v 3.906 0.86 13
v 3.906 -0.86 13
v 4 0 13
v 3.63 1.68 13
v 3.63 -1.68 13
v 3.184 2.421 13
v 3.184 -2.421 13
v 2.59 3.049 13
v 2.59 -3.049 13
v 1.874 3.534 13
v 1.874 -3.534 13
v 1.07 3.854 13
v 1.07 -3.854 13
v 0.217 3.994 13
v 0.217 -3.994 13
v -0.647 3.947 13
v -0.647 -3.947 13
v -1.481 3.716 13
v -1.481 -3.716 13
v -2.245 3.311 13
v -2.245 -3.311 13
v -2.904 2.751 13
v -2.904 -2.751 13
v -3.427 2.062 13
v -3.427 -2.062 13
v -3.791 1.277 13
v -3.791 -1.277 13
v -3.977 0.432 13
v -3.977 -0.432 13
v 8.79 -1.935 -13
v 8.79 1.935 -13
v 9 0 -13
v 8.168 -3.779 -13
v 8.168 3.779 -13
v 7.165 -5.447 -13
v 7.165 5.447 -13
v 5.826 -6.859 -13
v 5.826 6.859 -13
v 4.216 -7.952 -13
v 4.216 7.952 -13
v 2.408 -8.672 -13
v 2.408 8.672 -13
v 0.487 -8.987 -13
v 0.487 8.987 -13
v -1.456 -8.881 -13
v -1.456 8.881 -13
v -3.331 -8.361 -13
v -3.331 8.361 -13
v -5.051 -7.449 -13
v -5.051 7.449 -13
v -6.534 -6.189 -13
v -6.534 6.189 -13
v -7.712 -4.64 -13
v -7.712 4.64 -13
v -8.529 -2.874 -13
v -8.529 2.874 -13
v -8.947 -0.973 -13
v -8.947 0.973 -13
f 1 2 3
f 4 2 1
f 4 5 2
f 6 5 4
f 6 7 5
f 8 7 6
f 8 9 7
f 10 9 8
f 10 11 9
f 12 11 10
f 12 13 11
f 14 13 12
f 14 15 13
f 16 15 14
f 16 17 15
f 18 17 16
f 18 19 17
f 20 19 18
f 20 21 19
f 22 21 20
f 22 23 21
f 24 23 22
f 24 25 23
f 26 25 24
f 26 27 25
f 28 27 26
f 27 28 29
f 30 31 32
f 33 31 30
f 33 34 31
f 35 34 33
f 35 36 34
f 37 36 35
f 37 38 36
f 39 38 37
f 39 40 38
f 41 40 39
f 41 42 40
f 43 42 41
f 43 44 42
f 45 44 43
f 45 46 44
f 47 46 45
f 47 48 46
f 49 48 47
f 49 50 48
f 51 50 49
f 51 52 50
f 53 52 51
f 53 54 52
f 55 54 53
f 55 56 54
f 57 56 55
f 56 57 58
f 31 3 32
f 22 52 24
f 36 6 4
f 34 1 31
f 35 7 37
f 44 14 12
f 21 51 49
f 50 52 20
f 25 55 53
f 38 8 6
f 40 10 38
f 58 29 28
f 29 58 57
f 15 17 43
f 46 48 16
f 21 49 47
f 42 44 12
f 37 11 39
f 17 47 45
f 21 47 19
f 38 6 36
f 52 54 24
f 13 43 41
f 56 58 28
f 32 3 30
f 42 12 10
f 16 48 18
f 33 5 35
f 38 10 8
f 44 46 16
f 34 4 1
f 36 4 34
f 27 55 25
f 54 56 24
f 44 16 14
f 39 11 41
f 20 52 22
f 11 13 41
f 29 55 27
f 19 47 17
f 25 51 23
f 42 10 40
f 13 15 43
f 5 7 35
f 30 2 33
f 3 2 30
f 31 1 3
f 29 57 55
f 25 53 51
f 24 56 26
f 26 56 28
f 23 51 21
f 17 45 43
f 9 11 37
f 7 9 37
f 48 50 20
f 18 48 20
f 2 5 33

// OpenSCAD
intersection(){
  cube([30, 30, 26], center=true);
  cylinder(h=26, r1=9, r2=4, center=true);
}
